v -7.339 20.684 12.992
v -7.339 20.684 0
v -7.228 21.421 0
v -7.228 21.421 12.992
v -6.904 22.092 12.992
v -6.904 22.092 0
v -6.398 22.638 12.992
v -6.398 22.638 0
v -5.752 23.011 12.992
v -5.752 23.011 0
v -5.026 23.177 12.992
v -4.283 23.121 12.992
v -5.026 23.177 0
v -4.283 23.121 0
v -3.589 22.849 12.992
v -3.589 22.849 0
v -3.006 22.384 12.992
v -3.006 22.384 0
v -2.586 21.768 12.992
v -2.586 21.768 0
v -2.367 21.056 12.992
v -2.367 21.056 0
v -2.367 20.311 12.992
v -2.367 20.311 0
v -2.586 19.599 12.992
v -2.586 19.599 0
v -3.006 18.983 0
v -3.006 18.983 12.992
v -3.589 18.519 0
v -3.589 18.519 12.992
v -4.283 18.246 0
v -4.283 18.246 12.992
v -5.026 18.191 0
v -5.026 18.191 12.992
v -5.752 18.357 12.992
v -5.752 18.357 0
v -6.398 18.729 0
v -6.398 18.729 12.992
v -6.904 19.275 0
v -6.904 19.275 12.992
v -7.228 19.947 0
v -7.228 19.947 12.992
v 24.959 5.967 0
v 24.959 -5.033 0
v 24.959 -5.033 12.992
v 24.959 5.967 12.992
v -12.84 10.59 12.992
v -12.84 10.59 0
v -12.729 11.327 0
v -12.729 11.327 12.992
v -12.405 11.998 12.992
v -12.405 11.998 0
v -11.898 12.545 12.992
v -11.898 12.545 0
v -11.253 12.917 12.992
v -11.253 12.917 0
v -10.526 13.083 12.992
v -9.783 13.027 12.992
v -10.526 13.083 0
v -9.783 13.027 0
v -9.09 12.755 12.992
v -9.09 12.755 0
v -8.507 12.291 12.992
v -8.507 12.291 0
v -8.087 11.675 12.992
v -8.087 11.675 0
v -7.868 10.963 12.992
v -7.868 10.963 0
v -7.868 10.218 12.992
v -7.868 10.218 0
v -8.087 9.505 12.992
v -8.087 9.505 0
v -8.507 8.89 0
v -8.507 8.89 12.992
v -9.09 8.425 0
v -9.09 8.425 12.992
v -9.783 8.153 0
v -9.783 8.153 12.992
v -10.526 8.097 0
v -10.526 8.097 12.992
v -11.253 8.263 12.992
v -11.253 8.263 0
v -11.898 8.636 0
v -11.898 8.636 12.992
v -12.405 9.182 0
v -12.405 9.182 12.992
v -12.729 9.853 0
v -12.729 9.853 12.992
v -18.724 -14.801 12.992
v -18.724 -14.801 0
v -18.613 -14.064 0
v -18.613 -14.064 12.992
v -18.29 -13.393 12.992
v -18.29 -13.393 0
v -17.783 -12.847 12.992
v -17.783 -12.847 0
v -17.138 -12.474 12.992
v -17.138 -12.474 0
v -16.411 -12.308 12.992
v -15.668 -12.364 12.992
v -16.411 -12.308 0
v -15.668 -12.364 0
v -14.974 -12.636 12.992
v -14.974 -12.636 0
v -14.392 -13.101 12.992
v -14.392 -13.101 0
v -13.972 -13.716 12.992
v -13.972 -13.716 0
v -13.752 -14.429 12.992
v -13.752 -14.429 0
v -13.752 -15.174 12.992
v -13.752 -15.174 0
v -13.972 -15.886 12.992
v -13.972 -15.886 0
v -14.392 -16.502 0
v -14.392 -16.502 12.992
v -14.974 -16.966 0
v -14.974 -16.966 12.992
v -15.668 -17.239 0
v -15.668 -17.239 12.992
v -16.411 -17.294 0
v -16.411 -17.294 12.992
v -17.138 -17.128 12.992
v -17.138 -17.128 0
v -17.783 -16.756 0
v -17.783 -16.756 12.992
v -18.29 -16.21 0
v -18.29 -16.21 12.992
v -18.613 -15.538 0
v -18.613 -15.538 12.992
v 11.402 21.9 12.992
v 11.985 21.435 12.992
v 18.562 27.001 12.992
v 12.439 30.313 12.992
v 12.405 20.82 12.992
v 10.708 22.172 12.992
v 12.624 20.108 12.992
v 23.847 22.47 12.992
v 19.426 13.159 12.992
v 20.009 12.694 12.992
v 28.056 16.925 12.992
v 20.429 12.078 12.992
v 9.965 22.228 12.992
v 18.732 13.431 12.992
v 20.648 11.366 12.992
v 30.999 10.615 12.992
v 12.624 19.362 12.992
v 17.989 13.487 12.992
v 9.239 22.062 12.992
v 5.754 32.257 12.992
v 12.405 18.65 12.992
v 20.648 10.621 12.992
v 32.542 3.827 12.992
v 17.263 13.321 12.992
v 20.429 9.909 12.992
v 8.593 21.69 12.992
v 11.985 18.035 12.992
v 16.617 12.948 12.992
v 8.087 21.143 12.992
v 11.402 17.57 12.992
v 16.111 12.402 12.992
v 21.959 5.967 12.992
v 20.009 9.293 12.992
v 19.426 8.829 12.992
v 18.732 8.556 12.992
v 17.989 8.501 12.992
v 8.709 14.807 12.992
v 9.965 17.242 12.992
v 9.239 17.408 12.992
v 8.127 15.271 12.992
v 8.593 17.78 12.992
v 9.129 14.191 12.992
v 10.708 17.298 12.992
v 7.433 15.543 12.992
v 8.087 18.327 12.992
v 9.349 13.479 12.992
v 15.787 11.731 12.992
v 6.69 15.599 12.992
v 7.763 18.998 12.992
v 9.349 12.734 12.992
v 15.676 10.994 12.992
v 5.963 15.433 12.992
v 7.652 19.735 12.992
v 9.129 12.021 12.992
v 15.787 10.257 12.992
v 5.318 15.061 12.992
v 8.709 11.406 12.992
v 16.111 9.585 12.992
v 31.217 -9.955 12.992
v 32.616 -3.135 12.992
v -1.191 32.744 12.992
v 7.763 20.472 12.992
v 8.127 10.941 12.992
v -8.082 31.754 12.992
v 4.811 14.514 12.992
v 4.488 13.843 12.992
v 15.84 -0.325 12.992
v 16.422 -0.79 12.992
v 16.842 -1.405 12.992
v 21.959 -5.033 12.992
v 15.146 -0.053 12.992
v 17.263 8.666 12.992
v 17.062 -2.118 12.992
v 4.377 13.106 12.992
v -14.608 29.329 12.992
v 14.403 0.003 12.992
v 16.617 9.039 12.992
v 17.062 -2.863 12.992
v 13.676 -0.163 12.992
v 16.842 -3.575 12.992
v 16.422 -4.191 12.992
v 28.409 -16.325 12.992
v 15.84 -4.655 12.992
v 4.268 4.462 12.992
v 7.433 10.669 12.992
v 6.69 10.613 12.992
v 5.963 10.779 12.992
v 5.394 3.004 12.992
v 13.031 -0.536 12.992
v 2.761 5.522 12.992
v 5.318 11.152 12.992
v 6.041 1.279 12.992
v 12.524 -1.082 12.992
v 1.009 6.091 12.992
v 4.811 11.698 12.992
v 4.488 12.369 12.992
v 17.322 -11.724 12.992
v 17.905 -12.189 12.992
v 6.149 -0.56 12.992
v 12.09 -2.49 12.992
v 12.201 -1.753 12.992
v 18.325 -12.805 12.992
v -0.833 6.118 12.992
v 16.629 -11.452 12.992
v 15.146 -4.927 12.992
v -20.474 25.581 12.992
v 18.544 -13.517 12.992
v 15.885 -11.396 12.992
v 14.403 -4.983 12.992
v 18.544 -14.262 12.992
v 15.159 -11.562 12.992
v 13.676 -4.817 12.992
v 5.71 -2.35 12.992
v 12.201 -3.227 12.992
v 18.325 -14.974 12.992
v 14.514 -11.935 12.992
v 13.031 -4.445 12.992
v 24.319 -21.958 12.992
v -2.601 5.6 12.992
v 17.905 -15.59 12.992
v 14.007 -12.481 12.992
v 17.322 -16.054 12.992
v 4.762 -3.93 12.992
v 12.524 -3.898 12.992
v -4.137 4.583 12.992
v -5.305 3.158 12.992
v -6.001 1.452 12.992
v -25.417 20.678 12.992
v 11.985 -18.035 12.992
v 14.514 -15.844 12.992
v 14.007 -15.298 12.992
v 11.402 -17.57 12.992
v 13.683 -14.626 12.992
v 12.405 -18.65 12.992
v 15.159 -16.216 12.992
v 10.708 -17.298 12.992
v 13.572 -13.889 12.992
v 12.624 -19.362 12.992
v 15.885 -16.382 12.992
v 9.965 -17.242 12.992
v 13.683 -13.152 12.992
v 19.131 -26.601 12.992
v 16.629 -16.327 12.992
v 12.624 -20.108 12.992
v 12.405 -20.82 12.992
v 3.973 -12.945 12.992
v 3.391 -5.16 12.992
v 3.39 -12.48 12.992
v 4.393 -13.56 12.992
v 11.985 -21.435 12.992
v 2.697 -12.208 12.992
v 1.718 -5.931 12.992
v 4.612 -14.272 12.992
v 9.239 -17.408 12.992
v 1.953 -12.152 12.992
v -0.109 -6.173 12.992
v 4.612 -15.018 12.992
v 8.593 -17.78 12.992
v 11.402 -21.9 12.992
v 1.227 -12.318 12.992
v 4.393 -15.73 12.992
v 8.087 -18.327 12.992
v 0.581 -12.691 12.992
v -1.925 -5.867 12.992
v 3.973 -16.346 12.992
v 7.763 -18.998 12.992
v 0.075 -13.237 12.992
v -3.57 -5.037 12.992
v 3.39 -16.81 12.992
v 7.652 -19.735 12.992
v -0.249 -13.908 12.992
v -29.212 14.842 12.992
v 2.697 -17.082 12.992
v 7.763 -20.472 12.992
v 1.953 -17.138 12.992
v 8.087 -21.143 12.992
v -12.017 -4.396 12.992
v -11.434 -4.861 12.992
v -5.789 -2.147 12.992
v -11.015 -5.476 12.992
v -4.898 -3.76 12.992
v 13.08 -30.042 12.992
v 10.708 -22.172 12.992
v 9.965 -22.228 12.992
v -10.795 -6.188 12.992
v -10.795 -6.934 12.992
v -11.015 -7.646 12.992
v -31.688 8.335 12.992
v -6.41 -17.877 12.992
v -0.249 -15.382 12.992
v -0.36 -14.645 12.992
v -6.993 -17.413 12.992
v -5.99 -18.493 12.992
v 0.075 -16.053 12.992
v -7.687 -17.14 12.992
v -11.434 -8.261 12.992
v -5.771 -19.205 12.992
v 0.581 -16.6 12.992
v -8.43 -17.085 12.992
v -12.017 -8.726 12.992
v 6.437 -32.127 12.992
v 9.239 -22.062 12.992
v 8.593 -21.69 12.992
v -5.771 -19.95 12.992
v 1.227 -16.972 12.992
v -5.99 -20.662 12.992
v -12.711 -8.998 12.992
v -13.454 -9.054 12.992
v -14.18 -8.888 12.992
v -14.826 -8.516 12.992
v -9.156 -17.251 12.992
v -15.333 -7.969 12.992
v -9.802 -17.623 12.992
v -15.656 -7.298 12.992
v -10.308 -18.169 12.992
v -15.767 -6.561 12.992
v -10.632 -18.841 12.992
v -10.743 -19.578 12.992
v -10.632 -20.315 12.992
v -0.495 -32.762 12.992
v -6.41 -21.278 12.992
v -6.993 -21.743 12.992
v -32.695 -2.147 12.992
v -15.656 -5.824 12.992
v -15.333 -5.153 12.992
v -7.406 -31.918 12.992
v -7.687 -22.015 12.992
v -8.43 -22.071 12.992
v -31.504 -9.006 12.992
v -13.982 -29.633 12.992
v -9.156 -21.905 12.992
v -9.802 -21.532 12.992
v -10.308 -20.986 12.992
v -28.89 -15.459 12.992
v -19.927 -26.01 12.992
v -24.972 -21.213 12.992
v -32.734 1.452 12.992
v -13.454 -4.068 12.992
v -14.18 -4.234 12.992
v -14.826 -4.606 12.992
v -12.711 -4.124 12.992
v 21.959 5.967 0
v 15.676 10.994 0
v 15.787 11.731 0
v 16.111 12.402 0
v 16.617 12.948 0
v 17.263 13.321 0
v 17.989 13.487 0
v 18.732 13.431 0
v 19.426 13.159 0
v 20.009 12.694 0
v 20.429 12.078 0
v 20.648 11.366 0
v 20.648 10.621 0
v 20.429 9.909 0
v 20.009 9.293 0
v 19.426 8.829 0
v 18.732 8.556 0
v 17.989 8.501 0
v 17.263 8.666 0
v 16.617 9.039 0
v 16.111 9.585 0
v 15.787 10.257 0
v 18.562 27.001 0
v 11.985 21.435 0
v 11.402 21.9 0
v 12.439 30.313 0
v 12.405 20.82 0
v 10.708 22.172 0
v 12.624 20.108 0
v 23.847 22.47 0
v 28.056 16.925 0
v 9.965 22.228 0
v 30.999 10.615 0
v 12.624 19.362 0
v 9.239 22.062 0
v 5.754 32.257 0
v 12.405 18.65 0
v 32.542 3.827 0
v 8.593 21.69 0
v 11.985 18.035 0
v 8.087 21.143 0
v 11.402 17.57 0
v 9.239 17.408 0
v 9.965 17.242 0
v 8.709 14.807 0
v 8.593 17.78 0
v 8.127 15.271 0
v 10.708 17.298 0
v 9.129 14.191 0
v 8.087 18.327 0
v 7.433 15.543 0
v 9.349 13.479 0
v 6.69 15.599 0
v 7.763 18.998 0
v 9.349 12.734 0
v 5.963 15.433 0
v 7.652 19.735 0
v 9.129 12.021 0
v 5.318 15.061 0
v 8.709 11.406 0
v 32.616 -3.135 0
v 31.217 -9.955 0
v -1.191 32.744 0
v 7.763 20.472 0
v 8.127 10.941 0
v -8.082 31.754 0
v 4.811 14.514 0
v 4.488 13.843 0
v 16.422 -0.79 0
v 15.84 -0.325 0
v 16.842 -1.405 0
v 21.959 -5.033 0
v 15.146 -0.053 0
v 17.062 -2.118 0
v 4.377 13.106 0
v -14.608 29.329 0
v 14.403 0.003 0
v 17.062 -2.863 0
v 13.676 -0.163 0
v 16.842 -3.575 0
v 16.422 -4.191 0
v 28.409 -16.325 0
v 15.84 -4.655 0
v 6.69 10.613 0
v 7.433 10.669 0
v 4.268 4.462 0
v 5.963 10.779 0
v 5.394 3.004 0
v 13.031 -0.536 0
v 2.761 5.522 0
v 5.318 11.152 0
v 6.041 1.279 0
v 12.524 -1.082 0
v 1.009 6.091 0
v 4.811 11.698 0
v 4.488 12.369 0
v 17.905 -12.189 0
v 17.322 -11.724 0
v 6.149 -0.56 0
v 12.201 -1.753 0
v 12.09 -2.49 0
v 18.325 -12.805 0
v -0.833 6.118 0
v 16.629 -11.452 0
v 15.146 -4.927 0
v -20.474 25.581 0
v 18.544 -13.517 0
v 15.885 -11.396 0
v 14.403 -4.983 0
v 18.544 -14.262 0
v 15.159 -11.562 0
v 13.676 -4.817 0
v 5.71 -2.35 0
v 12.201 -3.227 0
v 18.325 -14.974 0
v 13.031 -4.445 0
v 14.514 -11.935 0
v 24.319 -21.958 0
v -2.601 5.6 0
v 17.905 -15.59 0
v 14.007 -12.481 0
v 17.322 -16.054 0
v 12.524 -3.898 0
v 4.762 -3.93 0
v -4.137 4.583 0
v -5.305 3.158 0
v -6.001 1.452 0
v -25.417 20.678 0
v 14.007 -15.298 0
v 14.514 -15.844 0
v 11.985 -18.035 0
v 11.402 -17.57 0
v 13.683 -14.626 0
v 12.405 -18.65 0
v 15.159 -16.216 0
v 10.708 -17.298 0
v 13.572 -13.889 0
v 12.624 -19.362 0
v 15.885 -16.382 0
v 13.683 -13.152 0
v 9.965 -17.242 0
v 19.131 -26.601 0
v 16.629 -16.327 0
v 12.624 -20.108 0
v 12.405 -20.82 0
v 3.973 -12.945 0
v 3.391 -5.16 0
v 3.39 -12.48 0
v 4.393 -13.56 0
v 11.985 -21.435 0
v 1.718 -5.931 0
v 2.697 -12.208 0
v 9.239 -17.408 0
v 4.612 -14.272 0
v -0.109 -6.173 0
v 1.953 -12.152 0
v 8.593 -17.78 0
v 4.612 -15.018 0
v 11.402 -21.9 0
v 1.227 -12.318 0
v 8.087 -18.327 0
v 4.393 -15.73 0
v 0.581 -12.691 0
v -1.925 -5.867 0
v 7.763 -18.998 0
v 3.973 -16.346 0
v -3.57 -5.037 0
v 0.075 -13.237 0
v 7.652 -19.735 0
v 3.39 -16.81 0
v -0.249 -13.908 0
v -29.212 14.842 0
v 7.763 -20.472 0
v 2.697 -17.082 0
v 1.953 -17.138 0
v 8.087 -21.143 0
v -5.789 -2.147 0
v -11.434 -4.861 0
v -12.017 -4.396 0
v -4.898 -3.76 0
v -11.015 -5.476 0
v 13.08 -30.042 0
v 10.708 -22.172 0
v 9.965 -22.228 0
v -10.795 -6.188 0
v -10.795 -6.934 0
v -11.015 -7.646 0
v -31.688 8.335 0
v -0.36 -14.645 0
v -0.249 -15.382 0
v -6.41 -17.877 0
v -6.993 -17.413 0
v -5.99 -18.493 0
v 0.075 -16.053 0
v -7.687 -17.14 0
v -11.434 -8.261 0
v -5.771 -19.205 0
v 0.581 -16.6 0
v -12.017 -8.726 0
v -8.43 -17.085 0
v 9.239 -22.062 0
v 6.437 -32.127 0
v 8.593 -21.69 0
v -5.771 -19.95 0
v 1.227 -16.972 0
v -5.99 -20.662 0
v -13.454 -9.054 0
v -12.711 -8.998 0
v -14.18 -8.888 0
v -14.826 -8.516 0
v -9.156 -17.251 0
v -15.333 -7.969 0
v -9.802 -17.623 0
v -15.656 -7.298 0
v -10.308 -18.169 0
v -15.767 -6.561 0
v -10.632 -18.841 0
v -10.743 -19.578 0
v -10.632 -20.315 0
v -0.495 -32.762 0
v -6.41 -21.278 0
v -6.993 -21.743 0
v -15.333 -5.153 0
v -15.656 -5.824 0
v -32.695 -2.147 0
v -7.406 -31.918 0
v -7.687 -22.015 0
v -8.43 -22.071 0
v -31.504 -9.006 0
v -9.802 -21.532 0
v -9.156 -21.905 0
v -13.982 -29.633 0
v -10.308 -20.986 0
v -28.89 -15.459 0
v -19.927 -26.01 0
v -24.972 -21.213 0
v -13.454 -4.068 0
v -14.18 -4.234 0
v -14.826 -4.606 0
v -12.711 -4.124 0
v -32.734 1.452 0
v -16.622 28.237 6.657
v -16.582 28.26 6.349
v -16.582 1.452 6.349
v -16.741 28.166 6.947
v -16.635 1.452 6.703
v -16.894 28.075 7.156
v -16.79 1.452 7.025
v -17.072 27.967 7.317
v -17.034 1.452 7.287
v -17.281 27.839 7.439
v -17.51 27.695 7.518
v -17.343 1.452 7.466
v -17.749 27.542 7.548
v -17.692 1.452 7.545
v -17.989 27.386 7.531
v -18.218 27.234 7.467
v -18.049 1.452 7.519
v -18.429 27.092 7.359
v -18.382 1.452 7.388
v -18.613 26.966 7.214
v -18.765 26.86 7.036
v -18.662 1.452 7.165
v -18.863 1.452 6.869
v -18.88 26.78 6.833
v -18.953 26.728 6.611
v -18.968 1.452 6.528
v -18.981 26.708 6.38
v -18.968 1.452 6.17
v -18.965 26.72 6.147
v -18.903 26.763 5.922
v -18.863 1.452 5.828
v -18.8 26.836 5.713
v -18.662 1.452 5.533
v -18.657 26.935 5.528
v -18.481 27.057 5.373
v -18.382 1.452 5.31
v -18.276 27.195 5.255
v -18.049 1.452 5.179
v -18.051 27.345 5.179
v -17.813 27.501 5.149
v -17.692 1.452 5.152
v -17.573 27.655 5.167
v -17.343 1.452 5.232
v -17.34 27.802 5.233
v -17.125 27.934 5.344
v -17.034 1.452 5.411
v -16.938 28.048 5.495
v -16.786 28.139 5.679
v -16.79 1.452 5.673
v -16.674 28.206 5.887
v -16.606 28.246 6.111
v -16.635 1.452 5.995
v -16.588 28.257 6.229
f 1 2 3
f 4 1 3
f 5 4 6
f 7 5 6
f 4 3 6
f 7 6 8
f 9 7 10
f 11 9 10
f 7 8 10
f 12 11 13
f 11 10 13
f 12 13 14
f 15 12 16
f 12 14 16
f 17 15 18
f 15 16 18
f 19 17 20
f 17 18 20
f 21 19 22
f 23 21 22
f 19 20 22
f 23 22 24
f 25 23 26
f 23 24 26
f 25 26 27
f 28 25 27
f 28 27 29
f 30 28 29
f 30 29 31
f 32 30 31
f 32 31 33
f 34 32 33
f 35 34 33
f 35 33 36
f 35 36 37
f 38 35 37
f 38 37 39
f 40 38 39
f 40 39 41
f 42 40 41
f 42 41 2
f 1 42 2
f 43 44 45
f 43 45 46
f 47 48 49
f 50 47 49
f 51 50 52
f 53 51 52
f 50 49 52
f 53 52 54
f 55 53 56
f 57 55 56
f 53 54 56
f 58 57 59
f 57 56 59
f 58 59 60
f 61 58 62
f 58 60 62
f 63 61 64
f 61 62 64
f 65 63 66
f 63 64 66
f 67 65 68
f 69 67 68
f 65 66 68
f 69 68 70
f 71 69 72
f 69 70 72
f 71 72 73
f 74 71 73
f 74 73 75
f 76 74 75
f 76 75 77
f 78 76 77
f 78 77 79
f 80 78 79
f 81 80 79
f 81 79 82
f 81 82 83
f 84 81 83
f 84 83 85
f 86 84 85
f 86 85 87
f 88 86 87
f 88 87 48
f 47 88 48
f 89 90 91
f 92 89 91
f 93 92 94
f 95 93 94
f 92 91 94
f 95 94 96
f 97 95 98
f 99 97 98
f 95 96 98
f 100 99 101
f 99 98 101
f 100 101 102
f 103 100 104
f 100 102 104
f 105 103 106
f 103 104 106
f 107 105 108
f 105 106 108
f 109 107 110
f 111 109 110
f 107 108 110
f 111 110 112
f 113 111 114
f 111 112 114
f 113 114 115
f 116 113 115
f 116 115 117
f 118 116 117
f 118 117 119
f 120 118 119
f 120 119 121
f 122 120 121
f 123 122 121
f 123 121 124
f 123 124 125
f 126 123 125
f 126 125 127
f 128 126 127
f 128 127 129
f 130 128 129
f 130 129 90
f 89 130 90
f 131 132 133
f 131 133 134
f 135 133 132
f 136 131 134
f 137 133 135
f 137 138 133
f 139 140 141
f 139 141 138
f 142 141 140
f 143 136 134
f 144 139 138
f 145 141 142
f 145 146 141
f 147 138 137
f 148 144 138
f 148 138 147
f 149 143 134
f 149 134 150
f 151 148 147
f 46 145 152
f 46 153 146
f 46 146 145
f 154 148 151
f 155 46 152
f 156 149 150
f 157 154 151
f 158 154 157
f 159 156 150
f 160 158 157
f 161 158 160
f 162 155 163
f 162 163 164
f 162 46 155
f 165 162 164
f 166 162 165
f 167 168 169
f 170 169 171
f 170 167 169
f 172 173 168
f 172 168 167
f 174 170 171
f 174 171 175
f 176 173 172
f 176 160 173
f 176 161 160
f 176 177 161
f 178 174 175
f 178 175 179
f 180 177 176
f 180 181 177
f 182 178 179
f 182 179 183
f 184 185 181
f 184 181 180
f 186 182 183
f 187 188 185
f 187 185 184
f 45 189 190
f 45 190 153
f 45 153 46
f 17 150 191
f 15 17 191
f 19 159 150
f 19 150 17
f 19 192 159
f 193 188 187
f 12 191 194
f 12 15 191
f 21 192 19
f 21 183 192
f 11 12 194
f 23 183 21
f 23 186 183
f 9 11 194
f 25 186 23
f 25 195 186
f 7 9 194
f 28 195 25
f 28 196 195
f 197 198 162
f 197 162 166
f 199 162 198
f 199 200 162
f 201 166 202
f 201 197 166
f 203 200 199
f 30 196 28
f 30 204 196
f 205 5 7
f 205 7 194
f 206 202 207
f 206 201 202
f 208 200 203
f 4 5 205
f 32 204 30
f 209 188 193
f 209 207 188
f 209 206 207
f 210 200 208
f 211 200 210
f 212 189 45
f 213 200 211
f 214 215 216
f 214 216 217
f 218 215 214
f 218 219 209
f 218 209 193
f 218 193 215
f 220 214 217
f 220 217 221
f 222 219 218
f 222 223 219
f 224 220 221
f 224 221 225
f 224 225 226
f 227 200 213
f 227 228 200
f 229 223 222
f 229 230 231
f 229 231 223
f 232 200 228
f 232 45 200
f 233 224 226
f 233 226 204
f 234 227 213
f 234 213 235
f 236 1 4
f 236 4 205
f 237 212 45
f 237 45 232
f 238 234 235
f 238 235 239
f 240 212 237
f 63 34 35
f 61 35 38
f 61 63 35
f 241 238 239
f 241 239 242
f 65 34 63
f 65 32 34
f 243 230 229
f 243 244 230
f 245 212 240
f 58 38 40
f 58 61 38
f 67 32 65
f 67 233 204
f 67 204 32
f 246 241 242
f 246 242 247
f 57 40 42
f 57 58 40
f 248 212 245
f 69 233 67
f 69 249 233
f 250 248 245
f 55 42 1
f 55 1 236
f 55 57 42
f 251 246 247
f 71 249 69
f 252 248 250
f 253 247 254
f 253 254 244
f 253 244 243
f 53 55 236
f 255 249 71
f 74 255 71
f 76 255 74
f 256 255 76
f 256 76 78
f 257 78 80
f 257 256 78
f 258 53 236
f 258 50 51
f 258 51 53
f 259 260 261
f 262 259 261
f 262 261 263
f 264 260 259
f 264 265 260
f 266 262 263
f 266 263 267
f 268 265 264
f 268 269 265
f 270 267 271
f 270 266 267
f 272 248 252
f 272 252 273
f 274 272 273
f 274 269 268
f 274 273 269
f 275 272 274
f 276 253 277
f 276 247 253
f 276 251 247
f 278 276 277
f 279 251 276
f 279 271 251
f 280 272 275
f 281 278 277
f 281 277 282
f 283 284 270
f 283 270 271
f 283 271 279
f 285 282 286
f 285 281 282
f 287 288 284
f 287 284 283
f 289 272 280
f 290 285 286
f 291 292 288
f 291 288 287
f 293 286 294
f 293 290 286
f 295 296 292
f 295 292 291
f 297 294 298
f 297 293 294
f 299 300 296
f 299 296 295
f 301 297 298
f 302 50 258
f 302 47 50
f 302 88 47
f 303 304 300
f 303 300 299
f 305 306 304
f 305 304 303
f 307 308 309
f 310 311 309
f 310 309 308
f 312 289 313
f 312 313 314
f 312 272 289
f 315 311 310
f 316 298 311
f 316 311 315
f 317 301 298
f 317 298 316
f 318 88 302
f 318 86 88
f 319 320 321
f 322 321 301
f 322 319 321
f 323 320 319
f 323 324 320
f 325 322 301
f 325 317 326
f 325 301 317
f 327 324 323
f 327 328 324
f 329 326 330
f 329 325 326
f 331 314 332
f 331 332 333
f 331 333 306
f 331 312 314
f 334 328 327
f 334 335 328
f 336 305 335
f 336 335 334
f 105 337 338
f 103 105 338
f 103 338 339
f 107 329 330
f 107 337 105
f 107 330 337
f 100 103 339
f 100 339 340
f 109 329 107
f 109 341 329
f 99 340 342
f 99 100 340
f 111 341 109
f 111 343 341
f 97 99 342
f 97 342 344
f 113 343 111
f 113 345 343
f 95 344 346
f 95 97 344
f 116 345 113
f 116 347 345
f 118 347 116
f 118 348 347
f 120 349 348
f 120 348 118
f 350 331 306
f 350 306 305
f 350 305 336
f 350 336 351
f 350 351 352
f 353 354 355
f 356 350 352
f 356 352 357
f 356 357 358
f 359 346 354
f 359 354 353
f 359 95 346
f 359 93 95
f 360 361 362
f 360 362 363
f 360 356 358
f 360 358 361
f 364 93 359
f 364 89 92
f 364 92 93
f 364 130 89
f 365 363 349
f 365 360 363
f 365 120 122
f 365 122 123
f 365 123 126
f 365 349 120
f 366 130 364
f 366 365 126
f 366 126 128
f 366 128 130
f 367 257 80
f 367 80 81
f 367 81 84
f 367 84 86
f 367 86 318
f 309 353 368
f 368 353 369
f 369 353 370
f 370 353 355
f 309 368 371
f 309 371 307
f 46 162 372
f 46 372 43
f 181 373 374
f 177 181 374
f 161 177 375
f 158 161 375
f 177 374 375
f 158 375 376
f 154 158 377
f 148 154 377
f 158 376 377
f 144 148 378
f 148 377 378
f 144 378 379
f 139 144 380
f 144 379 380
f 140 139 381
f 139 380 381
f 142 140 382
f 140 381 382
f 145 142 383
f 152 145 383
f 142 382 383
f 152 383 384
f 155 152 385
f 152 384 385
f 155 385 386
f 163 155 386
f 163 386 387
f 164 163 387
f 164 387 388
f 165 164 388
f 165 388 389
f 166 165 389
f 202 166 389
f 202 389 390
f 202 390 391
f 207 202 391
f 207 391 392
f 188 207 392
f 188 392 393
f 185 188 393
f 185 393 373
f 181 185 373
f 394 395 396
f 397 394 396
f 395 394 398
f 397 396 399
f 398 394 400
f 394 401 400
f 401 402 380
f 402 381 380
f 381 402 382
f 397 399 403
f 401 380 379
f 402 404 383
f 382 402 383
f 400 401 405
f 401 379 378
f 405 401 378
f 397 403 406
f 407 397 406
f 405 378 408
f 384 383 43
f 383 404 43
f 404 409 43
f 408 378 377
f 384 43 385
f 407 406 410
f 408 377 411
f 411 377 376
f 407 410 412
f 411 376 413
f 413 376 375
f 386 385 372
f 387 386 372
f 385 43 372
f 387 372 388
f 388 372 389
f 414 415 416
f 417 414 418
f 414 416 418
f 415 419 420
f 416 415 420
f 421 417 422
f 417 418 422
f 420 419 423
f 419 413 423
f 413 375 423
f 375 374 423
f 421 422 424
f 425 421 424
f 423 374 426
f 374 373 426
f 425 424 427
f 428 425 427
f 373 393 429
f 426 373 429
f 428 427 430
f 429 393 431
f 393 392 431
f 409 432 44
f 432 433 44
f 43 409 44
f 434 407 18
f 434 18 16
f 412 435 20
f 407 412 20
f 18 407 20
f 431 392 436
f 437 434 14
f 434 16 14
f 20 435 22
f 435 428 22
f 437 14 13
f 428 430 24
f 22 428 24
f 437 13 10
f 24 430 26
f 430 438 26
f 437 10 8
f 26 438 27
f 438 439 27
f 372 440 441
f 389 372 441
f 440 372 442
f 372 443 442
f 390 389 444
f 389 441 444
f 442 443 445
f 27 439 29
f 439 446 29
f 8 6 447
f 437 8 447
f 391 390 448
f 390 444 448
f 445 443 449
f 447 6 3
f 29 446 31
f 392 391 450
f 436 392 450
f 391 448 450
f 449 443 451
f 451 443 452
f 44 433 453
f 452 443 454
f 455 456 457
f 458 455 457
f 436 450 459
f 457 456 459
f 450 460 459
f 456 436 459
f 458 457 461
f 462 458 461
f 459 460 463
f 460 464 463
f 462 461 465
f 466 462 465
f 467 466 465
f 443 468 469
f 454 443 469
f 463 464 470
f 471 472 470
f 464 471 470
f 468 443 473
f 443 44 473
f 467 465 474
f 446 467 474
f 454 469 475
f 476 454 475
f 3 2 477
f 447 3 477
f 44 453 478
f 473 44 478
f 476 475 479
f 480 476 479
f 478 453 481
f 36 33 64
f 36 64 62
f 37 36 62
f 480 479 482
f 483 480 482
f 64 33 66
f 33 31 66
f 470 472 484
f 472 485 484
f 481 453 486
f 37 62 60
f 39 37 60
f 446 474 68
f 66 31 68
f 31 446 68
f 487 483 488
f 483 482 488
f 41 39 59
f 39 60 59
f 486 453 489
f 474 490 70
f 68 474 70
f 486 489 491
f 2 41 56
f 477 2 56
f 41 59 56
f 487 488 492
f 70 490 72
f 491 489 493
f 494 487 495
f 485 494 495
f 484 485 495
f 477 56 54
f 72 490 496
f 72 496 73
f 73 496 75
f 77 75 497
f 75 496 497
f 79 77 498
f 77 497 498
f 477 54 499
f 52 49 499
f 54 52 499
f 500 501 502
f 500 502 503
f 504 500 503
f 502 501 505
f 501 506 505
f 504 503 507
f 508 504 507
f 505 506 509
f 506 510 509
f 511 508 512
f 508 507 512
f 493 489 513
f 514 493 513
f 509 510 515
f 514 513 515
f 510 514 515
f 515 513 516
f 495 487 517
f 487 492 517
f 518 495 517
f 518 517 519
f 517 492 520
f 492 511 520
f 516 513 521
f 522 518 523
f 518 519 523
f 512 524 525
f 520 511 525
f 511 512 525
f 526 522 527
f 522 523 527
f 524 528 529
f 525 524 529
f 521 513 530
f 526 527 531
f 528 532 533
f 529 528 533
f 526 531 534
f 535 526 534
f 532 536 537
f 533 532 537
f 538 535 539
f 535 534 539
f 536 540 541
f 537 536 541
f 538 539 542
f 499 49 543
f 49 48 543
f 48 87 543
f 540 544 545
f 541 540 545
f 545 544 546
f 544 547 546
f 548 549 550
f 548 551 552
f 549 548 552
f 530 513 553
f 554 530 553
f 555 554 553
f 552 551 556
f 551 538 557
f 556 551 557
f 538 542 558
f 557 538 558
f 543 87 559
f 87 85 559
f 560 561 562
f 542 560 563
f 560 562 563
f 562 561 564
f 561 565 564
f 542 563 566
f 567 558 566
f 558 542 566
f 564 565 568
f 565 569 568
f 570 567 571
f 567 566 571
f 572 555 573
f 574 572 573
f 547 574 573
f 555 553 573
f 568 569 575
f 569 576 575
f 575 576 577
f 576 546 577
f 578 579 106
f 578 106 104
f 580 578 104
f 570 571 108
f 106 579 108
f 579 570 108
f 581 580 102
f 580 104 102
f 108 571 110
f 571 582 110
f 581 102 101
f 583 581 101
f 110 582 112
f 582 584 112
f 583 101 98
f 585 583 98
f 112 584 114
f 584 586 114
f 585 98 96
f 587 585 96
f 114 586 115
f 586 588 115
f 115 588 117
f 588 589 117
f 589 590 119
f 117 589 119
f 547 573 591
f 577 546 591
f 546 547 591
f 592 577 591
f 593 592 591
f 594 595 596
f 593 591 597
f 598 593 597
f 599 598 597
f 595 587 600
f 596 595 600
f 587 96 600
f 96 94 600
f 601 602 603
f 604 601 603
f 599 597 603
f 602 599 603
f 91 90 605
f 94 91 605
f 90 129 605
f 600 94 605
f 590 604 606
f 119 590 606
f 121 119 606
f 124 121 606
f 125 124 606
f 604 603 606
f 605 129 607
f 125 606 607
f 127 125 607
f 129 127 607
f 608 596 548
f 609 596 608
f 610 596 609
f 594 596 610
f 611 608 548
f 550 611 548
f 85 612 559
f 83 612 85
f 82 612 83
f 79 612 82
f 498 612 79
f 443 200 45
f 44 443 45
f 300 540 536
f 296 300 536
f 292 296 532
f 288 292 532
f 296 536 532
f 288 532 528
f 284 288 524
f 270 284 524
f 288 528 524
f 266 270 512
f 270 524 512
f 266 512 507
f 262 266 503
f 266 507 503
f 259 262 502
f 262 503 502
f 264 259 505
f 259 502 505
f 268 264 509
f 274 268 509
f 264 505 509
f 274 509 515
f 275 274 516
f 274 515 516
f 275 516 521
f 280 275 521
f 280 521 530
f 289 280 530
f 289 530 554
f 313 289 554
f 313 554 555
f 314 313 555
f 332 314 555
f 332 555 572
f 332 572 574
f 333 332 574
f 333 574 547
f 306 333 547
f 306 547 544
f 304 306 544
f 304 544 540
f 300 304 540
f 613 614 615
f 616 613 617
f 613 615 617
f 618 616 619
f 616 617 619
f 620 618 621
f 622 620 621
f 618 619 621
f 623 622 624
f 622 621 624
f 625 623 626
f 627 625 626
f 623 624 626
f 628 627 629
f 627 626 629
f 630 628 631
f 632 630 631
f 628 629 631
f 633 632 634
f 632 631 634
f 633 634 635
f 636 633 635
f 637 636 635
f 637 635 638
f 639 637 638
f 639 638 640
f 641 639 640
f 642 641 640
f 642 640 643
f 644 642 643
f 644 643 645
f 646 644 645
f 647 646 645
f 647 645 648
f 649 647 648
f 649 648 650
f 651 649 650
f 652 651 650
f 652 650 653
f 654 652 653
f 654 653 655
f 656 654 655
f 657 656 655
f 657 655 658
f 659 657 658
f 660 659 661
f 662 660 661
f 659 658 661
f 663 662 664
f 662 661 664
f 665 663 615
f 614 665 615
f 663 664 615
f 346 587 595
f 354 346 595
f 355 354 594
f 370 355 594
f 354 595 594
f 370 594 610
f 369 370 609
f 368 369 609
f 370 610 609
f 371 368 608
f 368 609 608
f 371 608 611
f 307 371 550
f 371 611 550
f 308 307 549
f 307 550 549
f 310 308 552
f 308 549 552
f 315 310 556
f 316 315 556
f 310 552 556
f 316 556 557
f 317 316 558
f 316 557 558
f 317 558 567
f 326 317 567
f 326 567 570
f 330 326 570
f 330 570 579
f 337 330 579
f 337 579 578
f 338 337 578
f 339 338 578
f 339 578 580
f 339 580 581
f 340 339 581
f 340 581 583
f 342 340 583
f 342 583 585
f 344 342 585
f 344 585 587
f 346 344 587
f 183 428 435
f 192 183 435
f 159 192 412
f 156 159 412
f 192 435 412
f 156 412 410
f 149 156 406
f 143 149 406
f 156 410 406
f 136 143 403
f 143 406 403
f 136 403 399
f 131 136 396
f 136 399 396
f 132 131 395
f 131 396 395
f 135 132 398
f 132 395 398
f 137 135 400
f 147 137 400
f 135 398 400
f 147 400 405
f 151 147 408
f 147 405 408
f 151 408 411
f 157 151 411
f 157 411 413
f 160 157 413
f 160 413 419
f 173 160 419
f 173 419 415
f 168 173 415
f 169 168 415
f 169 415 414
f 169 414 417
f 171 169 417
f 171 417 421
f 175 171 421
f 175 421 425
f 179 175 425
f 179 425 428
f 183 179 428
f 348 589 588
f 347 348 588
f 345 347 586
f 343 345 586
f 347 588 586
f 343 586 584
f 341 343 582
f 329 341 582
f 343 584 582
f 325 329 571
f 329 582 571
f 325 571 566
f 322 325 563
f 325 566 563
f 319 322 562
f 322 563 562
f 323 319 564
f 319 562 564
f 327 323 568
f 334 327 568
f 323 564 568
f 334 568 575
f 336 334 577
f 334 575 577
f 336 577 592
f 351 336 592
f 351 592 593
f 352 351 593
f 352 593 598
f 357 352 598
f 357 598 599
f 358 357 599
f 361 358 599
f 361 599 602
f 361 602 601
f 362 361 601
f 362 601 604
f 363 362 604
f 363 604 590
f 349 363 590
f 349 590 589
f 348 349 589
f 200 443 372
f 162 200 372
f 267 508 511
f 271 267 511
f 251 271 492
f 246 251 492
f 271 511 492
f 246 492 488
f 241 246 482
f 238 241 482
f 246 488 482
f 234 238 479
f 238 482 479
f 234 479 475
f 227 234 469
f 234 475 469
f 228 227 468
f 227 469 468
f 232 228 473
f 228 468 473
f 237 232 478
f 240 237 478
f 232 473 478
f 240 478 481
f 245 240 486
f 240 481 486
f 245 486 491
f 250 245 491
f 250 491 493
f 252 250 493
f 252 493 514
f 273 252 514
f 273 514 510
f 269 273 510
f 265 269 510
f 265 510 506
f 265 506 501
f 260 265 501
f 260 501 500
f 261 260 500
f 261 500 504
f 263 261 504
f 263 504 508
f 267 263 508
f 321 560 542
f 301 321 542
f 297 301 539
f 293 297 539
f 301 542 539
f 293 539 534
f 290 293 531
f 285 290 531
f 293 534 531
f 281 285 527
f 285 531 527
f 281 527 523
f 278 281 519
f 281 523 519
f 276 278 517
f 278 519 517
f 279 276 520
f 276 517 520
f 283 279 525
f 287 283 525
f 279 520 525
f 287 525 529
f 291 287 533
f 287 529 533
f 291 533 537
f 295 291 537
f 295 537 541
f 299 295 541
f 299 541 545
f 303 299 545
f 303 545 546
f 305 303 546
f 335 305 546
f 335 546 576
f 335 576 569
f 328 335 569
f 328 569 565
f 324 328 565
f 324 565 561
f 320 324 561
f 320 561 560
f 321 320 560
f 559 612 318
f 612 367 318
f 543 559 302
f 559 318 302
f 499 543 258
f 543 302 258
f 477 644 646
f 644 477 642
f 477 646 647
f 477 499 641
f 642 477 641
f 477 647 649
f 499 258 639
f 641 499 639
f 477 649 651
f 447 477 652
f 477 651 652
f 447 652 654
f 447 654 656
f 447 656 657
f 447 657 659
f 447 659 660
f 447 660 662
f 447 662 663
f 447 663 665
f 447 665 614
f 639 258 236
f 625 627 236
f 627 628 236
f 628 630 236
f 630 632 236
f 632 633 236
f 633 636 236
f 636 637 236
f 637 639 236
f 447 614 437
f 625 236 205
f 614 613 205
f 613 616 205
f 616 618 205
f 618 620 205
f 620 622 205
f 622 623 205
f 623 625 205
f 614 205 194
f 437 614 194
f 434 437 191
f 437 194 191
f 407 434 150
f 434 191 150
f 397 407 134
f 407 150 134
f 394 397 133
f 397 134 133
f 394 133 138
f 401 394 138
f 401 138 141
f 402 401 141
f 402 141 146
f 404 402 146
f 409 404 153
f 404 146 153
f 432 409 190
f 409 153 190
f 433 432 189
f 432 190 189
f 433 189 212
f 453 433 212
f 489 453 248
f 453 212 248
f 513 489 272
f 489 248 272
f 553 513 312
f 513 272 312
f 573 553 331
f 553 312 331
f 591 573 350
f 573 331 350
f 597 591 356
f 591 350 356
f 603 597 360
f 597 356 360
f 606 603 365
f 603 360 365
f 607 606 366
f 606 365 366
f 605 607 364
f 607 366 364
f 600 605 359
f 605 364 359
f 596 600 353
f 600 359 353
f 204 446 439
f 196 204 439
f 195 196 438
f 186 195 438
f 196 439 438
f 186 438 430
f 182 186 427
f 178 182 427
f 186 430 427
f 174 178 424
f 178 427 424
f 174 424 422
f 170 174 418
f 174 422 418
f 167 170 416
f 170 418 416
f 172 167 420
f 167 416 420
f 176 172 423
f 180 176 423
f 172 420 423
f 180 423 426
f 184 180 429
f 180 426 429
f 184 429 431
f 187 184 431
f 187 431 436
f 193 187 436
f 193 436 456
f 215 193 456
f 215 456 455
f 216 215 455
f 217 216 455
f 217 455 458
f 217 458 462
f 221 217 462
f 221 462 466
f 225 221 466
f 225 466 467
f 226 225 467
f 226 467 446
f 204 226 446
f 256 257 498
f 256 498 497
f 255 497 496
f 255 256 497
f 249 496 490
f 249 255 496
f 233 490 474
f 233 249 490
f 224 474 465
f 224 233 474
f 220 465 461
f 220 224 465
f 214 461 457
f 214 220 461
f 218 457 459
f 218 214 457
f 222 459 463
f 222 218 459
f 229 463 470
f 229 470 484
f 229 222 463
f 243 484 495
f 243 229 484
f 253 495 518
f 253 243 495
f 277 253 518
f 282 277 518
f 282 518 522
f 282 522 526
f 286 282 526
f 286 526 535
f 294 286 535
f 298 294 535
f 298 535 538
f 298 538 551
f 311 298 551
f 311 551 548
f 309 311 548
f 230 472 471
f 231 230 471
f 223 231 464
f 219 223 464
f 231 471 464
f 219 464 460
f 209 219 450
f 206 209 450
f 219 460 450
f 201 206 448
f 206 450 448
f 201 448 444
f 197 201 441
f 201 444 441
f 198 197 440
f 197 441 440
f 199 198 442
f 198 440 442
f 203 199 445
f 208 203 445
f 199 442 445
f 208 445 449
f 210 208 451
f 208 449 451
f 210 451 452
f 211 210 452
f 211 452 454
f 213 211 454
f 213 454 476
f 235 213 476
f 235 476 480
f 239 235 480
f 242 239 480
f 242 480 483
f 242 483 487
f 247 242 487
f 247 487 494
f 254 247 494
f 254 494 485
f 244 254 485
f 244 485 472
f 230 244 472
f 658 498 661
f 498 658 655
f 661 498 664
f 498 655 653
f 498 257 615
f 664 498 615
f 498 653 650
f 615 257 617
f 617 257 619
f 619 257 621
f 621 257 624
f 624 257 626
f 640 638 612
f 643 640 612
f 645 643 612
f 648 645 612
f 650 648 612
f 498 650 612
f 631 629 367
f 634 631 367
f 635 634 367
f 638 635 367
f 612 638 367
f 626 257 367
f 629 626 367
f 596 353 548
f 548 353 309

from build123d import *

# Parameters (mm, degrees)
F0_W     = 26.5914327465
F0_H     = 12.9917515442
F2_W     = 3
F2_H     = 11
F3_DEPTH = 25
F5_D     = 5
F7_D     = 2.4
F7_DEPTH = 32.7668578753


with BuildPart() as f1:
    # F0 (on Front) → F1 (revolve)
    with BuildSketch(Plane.XZ):
        with Locations((19.4701415021, 6.4958757721)):
            Rectangle(F0_W, F0_H)
    revolve(axis=Axis((0, 0, 8.0647598952), (0, 0, -1)))

    # F2 (on face) → F3 (cut)
    with BuildSketch(Plane.XY.offset(12.9917515442)):
        Polygon((-5.7890059302, -2.1473090164), (-6.0011490459, 1.4524929605), (-35.6950574279, 1.4524929605), (-35.6950574279, -2.1473090164), align=None)
        with Locations((23.4585951418, 0.467357954)):
            Rectangle(F2_W, F2_H)
    extrude(amount=-F3_DEPTH, mode=Mode.SUBTRACT)

    # F5 (through all)
    with Locations(Plane.XY.offset(12.9917515442)):
        with Locations((-10.3396493942, 10.5901481584), (6.8767020359, 13.1061266864), (14.5896849828, -2.4901164053), (2.1402191687, -14.6451032608), (-13.2669567932, -6.5610551786), (-4.8388554715, 20.6837356091), (18.1761129583, 10.9936508379), (-8.2428784436, -19.577701499), (16.0723110631, -13.8892857308), (10.152108036, 19.7349414229), (10.152108036, -19.7349414229), (-16.224399209, -14.8012051359)):
            Hole(F5_D / 2)

    # F7 (through all, one way)
    with BuildSketch(Plane.XZ):
        with Locations((-17.7818648517, 6.34881109)):
            Circle(F7_D / 2)
    extrude(amount=-F7_DEPTH, mode=Mode.SUBTRACT)


solid = f1.part
